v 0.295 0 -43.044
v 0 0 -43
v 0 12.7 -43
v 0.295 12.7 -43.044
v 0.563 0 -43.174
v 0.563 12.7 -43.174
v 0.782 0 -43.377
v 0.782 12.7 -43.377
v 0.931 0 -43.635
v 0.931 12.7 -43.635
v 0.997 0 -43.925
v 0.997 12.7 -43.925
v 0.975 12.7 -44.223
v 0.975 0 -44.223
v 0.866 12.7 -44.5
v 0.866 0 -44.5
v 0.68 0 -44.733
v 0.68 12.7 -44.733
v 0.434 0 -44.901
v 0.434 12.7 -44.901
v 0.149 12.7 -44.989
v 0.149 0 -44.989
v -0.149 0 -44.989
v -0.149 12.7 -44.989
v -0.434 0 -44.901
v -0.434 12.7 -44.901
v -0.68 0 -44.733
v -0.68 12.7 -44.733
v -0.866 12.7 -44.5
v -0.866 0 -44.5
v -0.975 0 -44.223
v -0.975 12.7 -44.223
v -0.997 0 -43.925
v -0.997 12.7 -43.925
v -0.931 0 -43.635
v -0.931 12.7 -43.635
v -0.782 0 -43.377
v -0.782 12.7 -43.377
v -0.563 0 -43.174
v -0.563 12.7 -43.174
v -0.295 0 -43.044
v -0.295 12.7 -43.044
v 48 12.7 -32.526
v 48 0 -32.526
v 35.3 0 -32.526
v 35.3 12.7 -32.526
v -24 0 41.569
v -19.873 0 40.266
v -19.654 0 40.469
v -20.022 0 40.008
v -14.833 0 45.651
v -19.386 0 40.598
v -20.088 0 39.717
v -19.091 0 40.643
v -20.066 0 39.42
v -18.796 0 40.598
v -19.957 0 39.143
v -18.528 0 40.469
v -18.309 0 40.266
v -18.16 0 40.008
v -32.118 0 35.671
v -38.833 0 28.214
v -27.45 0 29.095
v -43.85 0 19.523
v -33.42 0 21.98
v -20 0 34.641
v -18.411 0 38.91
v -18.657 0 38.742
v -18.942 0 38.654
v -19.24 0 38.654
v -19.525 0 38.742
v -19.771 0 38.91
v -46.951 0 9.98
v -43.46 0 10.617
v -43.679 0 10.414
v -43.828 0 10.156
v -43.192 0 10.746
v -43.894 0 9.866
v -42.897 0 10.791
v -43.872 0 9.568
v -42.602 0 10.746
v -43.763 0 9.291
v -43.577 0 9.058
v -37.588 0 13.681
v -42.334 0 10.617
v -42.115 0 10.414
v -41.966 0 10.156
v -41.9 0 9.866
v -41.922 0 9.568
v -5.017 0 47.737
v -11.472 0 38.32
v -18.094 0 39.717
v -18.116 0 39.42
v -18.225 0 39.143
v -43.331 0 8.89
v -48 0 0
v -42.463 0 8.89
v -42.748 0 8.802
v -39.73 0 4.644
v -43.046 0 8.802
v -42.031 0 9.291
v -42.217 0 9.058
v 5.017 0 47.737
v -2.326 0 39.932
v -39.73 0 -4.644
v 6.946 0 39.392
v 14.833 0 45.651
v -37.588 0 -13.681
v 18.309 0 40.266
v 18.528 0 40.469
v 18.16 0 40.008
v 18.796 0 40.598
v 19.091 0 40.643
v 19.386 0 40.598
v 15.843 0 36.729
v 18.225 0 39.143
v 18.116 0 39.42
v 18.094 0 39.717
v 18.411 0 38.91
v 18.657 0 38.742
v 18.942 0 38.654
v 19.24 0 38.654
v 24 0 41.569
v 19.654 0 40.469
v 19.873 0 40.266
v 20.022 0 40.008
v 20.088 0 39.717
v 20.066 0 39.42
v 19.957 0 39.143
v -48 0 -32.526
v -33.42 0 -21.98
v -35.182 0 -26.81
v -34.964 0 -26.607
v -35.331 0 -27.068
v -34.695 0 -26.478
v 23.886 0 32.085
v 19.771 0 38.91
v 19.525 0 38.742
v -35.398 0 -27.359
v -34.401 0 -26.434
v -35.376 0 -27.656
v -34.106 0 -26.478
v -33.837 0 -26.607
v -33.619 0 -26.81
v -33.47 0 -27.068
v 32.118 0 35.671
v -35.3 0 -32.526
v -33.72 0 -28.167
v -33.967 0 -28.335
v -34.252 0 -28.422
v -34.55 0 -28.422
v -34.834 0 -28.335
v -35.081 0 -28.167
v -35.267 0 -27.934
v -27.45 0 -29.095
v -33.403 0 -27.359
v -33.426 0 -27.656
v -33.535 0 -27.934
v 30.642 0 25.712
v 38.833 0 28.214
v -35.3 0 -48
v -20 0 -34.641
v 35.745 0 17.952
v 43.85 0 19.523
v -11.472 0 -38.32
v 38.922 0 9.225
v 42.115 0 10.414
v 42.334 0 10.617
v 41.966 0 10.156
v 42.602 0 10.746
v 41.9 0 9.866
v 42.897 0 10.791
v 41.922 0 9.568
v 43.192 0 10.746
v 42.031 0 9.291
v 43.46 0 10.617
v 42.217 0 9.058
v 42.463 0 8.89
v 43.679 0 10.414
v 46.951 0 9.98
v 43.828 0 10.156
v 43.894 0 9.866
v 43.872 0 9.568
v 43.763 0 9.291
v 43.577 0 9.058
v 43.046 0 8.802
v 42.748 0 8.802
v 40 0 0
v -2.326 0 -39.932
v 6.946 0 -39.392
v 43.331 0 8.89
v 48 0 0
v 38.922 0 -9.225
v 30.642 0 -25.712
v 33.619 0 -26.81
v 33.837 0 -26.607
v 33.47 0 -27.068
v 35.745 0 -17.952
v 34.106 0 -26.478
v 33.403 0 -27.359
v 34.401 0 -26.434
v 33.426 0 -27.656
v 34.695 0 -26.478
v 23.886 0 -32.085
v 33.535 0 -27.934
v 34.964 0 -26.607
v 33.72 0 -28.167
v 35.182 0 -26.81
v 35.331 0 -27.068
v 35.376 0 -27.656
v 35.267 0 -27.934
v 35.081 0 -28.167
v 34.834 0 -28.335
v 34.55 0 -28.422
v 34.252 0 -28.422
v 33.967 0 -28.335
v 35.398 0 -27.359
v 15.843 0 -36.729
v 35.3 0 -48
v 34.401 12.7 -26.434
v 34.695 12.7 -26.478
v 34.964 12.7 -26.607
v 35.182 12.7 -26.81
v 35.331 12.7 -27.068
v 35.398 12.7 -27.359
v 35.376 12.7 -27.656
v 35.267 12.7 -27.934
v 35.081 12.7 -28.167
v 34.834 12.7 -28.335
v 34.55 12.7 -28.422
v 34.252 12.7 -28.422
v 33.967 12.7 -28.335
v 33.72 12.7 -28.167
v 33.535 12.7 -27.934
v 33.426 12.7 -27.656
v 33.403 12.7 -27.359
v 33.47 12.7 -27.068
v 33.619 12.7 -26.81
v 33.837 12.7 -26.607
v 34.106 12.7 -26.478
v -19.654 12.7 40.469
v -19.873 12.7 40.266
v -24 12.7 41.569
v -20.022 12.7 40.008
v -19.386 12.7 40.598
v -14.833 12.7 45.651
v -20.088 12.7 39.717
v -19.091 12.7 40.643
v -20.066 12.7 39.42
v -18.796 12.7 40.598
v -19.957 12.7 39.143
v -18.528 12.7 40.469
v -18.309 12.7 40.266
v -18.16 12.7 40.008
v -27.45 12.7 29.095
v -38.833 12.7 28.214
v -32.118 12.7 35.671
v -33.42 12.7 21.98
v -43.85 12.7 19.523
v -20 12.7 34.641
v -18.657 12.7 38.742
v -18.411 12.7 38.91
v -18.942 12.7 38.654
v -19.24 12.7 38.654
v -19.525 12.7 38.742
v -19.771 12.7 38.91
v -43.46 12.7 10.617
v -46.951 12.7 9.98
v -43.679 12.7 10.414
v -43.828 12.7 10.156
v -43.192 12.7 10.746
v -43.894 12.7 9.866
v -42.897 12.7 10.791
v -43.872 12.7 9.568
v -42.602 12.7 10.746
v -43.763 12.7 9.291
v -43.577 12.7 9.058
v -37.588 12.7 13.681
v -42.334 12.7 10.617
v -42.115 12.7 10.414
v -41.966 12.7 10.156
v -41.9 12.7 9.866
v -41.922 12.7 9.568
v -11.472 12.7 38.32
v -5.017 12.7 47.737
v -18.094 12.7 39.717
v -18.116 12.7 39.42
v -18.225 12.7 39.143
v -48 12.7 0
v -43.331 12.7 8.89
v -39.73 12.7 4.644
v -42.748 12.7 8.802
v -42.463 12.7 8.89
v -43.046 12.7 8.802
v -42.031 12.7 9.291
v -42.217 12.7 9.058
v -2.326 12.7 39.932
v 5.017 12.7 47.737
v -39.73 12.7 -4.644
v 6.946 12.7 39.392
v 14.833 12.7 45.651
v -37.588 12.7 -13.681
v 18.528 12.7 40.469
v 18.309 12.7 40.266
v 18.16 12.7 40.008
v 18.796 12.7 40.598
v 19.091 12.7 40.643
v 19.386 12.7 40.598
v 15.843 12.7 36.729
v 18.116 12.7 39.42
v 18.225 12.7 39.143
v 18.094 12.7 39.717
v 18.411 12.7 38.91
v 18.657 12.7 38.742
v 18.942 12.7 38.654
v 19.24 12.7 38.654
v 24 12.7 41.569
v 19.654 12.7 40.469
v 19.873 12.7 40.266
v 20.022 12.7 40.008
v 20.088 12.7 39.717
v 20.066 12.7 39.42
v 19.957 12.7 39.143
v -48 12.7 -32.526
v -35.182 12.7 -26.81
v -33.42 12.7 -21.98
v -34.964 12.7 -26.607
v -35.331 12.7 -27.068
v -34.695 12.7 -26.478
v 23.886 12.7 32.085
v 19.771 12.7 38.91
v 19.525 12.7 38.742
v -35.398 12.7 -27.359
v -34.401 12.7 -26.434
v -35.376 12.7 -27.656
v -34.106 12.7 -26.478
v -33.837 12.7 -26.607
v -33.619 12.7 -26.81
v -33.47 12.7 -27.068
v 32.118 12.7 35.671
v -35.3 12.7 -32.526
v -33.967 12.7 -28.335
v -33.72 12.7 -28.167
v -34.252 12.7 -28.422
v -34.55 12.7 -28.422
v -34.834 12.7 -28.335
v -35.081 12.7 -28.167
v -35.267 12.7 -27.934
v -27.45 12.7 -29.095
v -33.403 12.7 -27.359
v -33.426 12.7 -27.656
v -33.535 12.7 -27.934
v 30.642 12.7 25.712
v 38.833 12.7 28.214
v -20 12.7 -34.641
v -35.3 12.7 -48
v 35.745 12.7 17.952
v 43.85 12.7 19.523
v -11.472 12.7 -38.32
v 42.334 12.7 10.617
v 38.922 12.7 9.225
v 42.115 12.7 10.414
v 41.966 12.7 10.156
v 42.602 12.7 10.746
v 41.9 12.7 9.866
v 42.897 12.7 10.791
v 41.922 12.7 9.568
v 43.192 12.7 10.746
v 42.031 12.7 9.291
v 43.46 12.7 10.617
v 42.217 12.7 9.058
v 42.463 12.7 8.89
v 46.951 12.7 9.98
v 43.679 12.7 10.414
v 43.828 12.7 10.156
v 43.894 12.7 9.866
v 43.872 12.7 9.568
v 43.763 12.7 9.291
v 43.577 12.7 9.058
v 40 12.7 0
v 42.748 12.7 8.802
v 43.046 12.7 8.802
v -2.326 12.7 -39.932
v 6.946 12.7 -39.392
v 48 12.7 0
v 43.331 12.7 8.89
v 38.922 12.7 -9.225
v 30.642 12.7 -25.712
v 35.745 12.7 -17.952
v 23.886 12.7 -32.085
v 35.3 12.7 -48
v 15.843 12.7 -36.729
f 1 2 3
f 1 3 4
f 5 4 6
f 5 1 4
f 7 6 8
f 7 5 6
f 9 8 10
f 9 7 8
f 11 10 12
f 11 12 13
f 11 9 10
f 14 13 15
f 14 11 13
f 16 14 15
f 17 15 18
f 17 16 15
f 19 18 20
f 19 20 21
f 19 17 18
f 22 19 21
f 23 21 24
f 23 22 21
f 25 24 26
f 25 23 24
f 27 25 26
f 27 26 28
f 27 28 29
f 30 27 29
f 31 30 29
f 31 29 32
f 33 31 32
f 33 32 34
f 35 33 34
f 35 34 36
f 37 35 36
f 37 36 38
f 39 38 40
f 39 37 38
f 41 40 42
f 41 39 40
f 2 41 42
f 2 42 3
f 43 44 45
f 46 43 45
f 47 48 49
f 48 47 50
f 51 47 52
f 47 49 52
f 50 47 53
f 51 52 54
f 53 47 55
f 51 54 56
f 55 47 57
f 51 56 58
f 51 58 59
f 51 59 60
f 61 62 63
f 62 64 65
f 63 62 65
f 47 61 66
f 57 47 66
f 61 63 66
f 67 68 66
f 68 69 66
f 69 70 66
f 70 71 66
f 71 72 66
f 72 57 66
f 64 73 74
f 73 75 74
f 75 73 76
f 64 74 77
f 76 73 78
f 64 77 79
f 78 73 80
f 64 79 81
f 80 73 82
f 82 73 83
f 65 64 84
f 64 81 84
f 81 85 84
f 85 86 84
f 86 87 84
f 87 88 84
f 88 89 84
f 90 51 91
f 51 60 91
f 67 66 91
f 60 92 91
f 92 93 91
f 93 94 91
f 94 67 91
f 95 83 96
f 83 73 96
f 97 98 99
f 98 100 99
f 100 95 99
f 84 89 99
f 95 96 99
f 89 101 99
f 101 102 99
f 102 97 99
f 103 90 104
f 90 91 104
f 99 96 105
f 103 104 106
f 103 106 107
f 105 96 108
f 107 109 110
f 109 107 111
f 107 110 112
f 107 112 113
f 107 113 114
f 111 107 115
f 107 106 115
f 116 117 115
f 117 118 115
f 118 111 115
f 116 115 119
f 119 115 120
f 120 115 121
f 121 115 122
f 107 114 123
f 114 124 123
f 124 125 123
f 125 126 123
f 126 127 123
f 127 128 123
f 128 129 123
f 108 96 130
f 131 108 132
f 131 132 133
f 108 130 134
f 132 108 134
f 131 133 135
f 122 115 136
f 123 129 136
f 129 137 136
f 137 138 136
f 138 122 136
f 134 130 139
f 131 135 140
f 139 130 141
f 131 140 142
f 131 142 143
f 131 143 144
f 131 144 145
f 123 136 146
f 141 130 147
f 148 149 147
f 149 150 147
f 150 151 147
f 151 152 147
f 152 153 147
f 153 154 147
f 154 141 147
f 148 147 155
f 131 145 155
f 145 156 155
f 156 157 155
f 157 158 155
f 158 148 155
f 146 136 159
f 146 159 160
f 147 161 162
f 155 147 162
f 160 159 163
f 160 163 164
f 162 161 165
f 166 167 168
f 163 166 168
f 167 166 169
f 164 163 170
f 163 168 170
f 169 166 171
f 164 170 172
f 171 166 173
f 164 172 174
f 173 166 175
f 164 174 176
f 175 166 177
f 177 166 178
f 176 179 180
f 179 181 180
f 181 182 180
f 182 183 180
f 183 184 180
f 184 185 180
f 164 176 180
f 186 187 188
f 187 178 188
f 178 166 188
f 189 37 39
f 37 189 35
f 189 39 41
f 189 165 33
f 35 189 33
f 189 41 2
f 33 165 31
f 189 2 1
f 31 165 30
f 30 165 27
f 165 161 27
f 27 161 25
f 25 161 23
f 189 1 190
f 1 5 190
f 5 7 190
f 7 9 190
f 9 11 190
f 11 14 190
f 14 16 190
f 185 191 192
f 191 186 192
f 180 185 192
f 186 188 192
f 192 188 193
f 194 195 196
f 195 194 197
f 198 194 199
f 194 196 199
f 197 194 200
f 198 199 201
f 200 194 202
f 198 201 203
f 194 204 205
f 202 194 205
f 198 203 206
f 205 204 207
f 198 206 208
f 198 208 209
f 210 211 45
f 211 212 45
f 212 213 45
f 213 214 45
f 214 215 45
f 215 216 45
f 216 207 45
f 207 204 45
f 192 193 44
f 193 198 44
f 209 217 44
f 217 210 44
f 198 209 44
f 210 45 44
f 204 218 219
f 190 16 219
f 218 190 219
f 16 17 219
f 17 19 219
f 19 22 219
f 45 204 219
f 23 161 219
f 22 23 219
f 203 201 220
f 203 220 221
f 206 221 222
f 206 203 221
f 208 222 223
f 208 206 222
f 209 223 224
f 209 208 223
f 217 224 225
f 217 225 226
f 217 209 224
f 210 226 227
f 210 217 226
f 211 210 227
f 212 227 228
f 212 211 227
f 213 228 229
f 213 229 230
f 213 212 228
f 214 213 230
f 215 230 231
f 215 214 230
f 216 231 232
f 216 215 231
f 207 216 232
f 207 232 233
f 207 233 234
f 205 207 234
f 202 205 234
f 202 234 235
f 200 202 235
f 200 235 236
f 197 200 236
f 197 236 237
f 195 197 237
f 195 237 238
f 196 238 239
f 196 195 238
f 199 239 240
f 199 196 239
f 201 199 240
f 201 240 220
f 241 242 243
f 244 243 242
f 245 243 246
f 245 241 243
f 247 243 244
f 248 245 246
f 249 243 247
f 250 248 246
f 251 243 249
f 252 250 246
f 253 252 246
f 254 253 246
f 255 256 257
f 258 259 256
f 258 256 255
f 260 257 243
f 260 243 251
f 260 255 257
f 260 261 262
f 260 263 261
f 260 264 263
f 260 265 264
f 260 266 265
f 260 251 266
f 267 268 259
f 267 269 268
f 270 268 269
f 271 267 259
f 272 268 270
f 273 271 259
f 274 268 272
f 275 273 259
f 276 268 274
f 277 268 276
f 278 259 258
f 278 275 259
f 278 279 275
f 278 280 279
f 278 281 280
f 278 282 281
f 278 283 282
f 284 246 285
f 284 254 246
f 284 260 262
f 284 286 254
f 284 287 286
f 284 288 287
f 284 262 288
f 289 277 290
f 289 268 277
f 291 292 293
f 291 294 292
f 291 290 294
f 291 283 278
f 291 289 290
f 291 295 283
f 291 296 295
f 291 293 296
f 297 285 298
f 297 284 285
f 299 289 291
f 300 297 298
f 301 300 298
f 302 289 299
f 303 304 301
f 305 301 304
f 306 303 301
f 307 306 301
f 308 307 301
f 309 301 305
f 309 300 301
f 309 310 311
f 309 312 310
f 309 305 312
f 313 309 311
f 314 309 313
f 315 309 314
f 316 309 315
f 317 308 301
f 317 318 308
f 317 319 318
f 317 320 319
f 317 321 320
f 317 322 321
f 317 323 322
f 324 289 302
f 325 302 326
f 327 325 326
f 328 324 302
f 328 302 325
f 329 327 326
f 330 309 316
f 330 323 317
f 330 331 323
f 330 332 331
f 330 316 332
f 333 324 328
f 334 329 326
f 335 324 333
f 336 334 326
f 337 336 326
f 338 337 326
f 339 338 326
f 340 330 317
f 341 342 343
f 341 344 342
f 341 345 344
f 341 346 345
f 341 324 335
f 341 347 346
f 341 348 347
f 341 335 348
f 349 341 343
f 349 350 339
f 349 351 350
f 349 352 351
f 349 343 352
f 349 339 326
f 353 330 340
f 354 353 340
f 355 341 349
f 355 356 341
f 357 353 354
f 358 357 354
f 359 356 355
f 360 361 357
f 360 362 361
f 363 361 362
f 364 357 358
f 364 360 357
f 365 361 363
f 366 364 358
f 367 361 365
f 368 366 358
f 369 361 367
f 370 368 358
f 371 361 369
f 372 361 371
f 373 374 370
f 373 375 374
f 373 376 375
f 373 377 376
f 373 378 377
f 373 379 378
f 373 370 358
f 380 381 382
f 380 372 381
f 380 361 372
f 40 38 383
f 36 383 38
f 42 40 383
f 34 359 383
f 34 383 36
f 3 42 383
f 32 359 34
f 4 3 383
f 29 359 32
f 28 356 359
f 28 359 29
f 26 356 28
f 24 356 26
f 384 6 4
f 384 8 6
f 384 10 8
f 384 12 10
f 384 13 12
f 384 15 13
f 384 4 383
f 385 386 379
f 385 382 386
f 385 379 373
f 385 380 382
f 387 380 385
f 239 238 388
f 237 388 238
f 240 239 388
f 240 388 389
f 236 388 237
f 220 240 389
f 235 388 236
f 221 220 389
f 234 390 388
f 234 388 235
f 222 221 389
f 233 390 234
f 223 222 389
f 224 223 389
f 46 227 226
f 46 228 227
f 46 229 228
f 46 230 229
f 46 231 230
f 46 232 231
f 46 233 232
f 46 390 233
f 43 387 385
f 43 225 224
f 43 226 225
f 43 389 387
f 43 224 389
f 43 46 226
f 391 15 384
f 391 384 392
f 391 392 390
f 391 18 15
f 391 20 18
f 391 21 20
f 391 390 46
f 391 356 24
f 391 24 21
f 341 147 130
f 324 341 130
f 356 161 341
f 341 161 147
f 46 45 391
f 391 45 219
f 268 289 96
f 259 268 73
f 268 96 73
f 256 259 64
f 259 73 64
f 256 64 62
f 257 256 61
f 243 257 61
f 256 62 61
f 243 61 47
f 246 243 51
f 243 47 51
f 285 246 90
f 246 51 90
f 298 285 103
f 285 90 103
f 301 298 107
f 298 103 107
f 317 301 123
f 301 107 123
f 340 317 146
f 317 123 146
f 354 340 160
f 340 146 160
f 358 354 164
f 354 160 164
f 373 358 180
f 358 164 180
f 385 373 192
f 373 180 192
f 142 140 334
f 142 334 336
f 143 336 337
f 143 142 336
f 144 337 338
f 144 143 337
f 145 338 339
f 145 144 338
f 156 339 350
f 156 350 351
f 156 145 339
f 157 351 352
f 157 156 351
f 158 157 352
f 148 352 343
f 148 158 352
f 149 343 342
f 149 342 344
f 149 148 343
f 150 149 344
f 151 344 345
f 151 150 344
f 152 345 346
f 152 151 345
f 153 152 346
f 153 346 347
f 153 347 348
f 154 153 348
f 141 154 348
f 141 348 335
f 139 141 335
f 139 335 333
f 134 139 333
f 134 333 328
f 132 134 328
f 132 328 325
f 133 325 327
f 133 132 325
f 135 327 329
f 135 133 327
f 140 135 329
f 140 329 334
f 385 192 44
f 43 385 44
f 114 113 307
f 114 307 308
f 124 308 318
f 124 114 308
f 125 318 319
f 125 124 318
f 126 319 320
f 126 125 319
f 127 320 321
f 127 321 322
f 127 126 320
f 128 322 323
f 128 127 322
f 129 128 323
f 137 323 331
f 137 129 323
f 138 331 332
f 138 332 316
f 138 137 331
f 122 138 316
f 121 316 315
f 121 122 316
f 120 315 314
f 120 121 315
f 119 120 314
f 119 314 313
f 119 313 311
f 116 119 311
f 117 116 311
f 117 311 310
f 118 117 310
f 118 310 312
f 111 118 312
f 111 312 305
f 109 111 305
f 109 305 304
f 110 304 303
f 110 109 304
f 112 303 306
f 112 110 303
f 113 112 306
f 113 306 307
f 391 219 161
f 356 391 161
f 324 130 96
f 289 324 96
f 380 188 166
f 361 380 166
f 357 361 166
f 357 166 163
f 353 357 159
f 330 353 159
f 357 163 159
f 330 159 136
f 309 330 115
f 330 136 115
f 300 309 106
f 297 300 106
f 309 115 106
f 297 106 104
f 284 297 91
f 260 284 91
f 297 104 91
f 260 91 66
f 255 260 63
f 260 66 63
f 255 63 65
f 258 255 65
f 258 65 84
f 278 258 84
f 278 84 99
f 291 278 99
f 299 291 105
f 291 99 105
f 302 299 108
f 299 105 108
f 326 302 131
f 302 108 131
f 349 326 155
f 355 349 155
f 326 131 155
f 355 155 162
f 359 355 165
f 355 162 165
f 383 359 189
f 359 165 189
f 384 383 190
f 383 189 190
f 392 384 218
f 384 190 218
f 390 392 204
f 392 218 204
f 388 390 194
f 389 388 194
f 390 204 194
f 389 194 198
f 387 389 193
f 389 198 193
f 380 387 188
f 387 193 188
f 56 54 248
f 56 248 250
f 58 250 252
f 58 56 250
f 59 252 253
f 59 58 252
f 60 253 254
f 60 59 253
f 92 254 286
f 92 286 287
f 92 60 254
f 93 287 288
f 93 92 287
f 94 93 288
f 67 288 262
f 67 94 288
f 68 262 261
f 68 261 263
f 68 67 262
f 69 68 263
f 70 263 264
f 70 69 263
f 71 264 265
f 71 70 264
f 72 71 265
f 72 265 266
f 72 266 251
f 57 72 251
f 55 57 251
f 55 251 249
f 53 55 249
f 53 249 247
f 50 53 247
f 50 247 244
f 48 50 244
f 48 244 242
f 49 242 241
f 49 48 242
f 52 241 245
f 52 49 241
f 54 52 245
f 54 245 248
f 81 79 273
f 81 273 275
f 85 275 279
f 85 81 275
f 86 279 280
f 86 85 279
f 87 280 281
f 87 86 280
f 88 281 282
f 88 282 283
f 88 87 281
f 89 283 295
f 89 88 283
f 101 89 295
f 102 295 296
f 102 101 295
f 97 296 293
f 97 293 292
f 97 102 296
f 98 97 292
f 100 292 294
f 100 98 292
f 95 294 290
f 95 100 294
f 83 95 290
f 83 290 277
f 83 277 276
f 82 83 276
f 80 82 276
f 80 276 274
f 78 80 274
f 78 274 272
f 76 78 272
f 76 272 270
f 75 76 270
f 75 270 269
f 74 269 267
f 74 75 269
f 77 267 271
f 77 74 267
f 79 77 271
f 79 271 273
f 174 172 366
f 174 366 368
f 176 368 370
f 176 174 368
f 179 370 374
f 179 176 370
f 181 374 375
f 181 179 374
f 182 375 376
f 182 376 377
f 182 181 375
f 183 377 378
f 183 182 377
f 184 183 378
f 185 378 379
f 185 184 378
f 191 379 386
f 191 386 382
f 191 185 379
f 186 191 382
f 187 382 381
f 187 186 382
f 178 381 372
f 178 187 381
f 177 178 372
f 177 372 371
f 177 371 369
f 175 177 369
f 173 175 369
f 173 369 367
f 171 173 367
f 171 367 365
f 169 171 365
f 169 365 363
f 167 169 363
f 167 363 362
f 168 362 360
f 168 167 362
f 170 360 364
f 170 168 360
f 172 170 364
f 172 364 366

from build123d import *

# Parameters (mm, degrees)
SKETCH1_R           = 40
SKETCH1_R_2         = 1
BOSS_EXTRUDE1_DEPTH = 12.7


with BuildPart() as part:
    # Sketch1 → Boss-Extrude1 (new body)
    with BuildSketch(Plane(origin=(0, 0, 0), x_dir=(1, 0, 0), z_dir=(0, 1, 0))):
        with BuildLine():
            Line((-35.3, 48), (-35.3, 32.525528435))
            Line((-35.3, 32.525528435), (-48, 32.525528435))
            Line((-48, 32.525528435), (-48, 0))
            ThreePointArc((-48, 0), (0, -48), (48, 0))
            Line((48, 0), (48, 32.525528435))
            Line((48, 32.525528435), (35.3, 32.525528435))
            Line((35.3, 32.525528435), (35.3, 48))
            Line((35.3, 48), (-35.3, 48))
        make_face()
        Circle(SKETCH1_R, mode=Mode.SUBTRACT)
        with Locations((34.400585229, 27.433551282)):
            Circle(SKETCH1_R_2, mode=Mode.SUBTRACT)
        with Locations((-34.400585229, 27.433551282)):
            Circle(SKETCH1_R_2, mode=Mode.SUBTRACT)
        with Locations((0, 44)):
            Circle(SKETCH1_R_2, mode=Mode.SUBTRACT)
        with Locations((19.090884521, -39.642630188)):
            Circle(SKETCH1_R_2, mode=Mode.SUBTRACT)
        with Locations((42.896828136, -9.790921094)):
            Circle(SKETCH1_R_2, mode=Mode.SUBTRACT)
        with Locations((-19.090884521, -39.642630188)):
            Circle(SKETCH1_R_2, mode=Mode.SUBTRACT)
        with Locations((-42.896828136, -9.790921094)):
            Circle(SKETCH1_R_2, mode=Mode.SUBTRACT)
    extrude(amount=BOSS_EXTRUDE1_DEPTH)


solid = part.part
